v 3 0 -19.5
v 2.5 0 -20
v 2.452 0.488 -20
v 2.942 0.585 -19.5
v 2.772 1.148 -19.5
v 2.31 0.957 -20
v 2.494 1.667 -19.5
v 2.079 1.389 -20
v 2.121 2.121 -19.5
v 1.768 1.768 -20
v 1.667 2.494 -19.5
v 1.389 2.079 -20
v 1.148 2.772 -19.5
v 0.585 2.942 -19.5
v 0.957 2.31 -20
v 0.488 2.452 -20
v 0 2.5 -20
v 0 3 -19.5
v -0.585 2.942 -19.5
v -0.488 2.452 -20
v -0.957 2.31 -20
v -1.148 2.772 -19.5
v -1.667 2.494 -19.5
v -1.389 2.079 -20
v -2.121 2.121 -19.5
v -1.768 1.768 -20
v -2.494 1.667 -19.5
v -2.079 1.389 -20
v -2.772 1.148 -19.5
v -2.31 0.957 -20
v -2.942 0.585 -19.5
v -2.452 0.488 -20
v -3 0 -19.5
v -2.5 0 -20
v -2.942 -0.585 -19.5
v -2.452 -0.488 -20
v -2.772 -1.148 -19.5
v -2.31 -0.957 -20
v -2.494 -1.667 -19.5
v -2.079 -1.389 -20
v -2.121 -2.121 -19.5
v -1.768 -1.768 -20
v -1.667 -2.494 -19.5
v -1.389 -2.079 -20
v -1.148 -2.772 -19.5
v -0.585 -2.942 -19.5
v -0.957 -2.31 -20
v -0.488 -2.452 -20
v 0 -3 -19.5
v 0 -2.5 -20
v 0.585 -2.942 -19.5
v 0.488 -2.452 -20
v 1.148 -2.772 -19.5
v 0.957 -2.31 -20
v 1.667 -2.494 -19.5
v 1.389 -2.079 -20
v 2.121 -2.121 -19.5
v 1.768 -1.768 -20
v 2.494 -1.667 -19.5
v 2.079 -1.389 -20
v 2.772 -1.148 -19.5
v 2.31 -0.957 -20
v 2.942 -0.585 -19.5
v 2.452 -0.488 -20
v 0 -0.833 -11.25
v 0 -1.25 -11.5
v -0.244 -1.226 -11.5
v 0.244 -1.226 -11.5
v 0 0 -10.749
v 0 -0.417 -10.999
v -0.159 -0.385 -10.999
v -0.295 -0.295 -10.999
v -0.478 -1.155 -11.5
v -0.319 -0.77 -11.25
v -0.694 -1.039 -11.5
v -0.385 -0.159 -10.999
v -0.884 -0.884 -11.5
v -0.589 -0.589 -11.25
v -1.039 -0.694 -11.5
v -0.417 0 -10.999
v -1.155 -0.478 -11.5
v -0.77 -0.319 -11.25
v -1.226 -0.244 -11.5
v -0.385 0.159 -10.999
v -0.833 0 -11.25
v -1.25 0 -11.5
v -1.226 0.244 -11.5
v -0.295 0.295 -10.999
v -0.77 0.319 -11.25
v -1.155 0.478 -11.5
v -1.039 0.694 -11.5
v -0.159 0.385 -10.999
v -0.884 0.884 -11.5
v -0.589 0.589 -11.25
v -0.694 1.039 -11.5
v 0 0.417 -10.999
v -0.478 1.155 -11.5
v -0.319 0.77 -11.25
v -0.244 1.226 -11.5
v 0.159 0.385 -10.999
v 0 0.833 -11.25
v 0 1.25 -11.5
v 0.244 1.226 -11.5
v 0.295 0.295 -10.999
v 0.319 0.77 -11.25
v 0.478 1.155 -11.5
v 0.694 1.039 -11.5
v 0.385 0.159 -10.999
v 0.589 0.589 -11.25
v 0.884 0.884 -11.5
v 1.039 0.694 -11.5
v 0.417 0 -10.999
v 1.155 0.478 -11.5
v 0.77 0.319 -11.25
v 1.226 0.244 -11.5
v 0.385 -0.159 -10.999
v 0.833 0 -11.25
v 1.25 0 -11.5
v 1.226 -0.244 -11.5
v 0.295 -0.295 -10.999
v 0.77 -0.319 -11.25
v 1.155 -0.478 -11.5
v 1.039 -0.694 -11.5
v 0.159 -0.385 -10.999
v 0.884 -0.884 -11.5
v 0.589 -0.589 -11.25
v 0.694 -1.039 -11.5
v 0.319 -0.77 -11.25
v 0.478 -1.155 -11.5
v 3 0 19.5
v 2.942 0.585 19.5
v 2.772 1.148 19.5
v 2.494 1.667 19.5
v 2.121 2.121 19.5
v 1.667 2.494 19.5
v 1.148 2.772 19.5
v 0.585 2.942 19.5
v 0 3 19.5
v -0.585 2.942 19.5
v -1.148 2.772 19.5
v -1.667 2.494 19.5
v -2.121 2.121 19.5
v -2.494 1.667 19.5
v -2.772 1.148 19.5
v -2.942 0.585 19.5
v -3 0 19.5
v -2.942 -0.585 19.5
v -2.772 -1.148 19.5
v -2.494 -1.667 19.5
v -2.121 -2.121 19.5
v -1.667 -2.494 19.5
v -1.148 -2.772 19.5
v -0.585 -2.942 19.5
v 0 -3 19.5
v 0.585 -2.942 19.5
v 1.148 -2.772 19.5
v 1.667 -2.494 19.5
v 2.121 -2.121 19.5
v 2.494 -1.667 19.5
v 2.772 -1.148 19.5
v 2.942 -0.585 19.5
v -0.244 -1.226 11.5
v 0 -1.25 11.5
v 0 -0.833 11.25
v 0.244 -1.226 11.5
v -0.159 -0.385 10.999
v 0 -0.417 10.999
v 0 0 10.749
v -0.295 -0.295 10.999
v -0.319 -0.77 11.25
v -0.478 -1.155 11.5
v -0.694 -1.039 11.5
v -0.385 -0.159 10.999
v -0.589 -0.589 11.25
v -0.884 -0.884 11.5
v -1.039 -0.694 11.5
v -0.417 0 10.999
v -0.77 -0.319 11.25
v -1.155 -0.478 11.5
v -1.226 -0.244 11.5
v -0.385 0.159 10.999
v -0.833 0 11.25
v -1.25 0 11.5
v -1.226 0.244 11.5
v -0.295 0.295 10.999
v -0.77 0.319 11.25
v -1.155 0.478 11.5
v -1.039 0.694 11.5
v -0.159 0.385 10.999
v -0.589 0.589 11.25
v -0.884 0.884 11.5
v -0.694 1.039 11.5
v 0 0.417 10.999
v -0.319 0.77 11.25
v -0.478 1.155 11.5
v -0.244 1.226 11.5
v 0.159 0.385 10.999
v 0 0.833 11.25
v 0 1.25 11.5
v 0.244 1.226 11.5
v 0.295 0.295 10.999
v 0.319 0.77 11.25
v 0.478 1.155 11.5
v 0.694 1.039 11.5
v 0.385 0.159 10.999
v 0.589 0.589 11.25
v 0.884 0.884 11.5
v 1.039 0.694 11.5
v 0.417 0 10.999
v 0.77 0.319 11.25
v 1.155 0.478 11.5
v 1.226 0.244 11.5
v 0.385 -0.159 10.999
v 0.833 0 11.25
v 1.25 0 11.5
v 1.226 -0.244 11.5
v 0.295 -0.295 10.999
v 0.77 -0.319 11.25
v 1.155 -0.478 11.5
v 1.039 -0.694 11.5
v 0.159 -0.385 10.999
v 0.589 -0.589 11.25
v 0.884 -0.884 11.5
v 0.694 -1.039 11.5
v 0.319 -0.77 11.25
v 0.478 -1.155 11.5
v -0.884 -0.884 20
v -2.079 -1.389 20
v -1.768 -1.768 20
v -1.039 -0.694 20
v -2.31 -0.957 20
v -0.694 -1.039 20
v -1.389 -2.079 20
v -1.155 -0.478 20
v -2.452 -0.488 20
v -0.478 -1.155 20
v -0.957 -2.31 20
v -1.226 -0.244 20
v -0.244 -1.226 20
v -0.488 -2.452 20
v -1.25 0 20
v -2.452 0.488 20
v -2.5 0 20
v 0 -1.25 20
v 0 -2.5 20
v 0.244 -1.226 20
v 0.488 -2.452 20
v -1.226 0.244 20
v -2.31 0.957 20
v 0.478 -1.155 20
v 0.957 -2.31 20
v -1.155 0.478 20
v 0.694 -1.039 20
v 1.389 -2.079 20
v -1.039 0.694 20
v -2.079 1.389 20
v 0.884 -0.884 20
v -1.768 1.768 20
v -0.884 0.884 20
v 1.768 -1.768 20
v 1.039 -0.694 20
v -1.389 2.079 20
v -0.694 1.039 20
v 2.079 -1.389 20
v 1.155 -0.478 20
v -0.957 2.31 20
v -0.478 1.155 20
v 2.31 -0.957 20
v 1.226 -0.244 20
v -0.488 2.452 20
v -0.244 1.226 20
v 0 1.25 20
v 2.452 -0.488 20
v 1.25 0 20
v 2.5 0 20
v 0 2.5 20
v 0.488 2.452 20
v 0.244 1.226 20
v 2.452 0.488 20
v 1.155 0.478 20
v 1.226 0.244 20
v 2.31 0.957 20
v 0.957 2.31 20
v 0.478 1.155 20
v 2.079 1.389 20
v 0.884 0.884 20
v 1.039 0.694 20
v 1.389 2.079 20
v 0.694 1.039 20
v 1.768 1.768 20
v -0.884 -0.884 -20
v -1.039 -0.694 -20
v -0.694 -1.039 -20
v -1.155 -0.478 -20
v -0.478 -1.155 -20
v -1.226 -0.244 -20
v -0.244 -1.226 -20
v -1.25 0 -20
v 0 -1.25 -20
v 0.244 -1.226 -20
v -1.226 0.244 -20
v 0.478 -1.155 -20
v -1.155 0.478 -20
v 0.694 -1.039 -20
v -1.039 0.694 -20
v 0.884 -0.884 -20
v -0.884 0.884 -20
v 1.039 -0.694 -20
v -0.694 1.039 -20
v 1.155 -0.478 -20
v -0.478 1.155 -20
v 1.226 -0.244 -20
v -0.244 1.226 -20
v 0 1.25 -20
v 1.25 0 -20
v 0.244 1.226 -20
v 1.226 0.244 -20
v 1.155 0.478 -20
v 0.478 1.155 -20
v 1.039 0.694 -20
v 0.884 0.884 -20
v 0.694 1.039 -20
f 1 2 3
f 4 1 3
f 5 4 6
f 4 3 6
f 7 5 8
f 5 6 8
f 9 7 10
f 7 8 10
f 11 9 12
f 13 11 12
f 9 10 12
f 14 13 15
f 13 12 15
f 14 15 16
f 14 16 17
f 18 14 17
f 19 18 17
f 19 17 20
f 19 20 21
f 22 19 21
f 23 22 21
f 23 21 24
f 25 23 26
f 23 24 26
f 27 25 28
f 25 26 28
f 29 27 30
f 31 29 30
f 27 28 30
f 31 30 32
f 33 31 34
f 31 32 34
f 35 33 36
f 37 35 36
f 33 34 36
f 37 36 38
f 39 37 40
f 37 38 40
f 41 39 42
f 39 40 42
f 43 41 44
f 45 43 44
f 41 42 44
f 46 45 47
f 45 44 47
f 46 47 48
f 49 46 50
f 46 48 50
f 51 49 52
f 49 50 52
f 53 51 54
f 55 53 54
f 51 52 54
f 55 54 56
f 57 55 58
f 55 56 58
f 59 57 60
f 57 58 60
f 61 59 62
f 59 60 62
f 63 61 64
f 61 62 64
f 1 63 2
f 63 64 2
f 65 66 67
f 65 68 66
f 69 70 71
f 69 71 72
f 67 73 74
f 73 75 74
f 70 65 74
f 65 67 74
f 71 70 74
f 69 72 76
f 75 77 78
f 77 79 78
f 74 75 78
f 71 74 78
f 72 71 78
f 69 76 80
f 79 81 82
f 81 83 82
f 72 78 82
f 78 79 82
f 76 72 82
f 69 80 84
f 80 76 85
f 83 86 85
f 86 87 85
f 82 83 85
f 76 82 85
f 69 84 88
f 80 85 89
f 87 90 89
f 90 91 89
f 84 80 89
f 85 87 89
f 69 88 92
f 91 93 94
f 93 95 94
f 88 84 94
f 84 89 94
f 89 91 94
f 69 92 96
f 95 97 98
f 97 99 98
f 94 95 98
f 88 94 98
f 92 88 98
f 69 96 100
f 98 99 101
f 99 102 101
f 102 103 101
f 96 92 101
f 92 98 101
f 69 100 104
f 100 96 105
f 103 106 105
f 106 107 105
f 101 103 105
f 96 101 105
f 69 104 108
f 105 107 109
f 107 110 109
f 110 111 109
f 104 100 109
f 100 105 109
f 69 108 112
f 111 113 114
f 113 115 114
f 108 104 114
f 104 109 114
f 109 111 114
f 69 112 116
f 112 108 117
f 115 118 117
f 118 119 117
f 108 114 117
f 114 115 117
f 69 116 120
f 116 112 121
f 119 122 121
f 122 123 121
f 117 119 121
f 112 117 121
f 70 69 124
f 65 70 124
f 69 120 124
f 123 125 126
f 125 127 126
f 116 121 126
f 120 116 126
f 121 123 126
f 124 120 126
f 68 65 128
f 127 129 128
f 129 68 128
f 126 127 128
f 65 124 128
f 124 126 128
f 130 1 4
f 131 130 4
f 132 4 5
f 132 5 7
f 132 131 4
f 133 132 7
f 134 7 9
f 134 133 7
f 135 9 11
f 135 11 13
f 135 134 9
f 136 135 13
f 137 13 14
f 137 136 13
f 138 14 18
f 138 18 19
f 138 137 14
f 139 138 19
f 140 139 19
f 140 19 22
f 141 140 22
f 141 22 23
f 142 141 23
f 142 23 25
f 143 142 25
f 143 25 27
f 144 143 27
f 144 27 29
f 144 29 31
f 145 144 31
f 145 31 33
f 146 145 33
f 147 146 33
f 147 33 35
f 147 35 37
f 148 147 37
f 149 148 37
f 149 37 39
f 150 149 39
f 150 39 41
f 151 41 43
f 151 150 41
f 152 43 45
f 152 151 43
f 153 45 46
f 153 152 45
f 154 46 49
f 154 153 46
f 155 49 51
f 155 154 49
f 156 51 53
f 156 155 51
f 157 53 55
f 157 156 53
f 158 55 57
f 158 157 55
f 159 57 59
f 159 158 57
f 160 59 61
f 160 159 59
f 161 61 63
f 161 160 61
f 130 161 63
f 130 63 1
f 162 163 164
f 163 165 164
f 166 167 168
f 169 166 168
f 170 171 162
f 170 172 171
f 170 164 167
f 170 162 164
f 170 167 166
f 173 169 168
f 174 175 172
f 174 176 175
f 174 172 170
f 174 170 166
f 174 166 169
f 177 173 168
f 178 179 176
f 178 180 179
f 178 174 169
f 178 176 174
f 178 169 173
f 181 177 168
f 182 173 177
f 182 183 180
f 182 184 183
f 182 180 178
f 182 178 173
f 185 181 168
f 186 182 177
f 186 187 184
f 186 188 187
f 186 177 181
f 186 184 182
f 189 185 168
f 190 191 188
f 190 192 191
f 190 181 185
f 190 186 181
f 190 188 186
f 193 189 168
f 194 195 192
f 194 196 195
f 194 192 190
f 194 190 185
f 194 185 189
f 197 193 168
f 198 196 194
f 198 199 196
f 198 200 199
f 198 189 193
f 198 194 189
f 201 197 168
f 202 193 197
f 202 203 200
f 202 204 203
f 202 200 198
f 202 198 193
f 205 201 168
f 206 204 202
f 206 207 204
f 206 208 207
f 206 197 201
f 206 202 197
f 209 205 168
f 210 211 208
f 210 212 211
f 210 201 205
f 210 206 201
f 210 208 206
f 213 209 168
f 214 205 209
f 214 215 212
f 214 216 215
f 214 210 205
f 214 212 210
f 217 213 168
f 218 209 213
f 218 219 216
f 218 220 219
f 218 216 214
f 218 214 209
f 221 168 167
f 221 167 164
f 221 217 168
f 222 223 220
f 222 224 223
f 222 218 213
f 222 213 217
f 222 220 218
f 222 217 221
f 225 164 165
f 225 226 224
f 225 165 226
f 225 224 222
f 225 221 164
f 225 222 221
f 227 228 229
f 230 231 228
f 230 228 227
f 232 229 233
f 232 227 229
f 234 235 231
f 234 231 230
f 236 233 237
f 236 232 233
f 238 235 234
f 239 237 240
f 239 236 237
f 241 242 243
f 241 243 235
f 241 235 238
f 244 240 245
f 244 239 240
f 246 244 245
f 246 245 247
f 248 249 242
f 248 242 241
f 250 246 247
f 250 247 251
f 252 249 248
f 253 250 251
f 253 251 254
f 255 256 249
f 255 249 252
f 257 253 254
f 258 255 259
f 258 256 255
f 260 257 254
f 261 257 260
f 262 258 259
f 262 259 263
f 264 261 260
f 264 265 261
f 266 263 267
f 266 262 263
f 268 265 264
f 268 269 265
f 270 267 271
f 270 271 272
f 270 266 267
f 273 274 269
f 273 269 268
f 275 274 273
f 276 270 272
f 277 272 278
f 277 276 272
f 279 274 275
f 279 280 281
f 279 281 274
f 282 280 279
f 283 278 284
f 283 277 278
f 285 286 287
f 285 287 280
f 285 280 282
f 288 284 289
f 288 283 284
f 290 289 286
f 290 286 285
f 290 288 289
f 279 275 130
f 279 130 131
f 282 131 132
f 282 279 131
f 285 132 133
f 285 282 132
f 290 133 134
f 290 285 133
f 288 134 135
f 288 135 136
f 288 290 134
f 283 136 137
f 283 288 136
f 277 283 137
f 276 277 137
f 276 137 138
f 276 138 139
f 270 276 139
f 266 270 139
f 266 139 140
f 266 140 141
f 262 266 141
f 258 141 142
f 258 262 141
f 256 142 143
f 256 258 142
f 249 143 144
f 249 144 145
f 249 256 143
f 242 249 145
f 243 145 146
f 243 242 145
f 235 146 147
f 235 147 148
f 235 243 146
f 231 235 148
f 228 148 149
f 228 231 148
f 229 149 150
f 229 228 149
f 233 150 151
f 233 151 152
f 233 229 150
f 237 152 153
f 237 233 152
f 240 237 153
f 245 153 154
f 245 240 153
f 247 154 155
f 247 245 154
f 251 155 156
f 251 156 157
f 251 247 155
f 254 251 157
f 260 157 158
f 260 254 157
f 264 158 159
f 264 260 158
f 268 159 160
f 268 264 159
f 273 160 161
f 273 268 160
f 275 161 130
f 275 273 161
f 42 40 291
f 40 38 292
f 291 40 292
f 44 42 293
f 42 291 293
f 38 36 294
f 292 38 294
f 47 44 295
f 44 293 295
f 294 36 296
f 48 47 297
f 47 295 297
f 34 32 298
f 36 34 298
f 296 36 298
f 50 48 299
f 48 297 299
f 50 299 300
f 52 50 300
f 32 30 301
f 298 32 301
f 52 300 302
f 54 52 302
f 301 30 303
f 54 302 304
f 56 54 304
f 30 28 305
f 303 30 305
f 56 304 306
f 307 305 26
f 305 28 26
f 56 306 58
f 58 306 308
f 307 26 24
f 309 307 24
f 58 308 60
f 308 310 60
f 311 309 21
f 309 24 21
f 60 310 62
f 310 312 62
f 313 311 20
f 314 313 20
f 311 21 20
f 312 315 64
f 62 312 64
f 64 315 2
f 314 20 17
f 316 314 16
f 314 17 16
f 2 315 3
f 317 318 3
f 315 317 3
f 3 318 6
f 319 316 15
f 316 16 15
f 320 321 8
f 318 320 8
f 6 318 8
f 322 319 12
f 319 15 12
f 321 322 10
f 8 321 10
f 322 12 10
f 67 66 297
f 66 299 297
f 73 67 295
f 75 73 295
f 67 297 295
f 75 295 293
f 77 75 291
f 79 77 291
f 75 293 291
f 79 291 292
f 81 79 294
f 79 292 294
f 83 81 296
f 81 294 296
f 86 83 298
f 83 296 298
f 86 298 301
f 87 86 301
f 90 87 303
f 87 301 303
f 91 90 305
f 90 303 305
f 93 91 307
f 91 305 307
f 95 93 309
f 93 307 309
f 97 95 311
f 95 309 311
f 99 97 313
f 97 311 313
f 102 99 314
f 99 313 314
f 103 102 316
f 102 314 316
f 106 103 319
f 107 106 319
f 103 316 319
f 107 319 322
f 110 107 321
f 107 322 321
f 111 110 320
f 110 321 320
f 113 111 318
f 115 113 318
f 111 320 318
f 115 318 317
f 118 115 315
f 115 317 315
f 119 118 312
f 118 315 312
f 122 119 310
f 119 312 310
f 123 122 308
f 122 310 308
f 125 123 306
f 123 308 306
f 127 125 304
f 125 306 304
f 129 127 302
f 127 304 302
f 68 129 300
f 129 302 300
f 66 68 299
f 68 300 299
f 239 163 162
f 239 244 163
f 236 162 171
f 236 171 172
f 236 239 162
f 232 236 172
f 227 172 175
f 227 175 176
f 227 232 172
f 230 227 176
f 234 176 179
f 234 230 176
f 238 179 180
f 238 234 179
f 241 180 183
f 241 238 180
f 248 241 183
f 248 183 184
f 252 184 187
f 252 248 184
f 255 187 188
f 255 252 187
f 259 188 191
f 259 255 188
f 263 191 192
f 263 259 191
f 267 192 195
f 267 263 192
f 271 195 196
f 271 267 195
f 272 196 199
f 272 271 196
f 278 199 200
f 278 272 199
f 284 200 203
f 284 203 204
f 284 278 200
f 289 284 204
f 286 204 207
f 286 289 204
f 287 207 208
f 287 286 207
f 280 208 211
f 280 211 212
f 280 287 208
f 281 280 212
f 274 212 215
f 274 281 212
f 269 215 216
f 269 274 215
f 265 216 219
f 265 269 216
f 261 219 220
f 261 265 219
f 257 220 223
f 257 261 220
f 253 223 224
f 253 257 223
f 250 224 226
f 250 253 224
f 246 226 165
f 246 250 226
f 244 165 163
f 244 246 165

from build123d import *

# Parameters (mm, degrees)
SKETCH_2_R      = 3
EXTRUDE_1_DEPTH = 20
CHAMFER_1_SIZE  = 0.5


with BuildPart() as part:
    # ｽｹｯﾁ2 → ﾎﾞｽ - 押し出し1 (new, symmetric)
    with BuildSketch(Plane.XY):
        Circle(SKETCH_2_R)
    extrude(amount=EXTRUDE_1_DEPTH, both=True)

    # ｽｹｯﾁ4 → M3 ねじ穴1 (revolve, cut)
    with BuildSketch(Plane(origin=(0, 0, 20), x_dir=(0, -1, 0), z_dir=(1, 0, 0))):
        Polygon((0, 0), (0, 9.251075774), (1.25, 8.5), (1.25, 0), align=None)
    hole_wizard_m3_1 = revolve(axis=Axis((0, 0, 26.35), (0, 0, -1)), mode=Mode.SUBTRACT)

    # ﾐﾗｰ1: M3 ねじ穴1 across plane
    add(hole_wizard_m3_1.mirror(Plane.XY), mode=Mode.SUBTRACT)

    # 面取り1
    chamfer_1_edges = [part.edges().sort_by_distance(p)[0] for p in [
        (-3, 0, -20),
        (-3, 0, 20),
    ]]
    chamfer(chamfer_1_edges, length=CHAMFER_1_SIZE)


solid = part.part
